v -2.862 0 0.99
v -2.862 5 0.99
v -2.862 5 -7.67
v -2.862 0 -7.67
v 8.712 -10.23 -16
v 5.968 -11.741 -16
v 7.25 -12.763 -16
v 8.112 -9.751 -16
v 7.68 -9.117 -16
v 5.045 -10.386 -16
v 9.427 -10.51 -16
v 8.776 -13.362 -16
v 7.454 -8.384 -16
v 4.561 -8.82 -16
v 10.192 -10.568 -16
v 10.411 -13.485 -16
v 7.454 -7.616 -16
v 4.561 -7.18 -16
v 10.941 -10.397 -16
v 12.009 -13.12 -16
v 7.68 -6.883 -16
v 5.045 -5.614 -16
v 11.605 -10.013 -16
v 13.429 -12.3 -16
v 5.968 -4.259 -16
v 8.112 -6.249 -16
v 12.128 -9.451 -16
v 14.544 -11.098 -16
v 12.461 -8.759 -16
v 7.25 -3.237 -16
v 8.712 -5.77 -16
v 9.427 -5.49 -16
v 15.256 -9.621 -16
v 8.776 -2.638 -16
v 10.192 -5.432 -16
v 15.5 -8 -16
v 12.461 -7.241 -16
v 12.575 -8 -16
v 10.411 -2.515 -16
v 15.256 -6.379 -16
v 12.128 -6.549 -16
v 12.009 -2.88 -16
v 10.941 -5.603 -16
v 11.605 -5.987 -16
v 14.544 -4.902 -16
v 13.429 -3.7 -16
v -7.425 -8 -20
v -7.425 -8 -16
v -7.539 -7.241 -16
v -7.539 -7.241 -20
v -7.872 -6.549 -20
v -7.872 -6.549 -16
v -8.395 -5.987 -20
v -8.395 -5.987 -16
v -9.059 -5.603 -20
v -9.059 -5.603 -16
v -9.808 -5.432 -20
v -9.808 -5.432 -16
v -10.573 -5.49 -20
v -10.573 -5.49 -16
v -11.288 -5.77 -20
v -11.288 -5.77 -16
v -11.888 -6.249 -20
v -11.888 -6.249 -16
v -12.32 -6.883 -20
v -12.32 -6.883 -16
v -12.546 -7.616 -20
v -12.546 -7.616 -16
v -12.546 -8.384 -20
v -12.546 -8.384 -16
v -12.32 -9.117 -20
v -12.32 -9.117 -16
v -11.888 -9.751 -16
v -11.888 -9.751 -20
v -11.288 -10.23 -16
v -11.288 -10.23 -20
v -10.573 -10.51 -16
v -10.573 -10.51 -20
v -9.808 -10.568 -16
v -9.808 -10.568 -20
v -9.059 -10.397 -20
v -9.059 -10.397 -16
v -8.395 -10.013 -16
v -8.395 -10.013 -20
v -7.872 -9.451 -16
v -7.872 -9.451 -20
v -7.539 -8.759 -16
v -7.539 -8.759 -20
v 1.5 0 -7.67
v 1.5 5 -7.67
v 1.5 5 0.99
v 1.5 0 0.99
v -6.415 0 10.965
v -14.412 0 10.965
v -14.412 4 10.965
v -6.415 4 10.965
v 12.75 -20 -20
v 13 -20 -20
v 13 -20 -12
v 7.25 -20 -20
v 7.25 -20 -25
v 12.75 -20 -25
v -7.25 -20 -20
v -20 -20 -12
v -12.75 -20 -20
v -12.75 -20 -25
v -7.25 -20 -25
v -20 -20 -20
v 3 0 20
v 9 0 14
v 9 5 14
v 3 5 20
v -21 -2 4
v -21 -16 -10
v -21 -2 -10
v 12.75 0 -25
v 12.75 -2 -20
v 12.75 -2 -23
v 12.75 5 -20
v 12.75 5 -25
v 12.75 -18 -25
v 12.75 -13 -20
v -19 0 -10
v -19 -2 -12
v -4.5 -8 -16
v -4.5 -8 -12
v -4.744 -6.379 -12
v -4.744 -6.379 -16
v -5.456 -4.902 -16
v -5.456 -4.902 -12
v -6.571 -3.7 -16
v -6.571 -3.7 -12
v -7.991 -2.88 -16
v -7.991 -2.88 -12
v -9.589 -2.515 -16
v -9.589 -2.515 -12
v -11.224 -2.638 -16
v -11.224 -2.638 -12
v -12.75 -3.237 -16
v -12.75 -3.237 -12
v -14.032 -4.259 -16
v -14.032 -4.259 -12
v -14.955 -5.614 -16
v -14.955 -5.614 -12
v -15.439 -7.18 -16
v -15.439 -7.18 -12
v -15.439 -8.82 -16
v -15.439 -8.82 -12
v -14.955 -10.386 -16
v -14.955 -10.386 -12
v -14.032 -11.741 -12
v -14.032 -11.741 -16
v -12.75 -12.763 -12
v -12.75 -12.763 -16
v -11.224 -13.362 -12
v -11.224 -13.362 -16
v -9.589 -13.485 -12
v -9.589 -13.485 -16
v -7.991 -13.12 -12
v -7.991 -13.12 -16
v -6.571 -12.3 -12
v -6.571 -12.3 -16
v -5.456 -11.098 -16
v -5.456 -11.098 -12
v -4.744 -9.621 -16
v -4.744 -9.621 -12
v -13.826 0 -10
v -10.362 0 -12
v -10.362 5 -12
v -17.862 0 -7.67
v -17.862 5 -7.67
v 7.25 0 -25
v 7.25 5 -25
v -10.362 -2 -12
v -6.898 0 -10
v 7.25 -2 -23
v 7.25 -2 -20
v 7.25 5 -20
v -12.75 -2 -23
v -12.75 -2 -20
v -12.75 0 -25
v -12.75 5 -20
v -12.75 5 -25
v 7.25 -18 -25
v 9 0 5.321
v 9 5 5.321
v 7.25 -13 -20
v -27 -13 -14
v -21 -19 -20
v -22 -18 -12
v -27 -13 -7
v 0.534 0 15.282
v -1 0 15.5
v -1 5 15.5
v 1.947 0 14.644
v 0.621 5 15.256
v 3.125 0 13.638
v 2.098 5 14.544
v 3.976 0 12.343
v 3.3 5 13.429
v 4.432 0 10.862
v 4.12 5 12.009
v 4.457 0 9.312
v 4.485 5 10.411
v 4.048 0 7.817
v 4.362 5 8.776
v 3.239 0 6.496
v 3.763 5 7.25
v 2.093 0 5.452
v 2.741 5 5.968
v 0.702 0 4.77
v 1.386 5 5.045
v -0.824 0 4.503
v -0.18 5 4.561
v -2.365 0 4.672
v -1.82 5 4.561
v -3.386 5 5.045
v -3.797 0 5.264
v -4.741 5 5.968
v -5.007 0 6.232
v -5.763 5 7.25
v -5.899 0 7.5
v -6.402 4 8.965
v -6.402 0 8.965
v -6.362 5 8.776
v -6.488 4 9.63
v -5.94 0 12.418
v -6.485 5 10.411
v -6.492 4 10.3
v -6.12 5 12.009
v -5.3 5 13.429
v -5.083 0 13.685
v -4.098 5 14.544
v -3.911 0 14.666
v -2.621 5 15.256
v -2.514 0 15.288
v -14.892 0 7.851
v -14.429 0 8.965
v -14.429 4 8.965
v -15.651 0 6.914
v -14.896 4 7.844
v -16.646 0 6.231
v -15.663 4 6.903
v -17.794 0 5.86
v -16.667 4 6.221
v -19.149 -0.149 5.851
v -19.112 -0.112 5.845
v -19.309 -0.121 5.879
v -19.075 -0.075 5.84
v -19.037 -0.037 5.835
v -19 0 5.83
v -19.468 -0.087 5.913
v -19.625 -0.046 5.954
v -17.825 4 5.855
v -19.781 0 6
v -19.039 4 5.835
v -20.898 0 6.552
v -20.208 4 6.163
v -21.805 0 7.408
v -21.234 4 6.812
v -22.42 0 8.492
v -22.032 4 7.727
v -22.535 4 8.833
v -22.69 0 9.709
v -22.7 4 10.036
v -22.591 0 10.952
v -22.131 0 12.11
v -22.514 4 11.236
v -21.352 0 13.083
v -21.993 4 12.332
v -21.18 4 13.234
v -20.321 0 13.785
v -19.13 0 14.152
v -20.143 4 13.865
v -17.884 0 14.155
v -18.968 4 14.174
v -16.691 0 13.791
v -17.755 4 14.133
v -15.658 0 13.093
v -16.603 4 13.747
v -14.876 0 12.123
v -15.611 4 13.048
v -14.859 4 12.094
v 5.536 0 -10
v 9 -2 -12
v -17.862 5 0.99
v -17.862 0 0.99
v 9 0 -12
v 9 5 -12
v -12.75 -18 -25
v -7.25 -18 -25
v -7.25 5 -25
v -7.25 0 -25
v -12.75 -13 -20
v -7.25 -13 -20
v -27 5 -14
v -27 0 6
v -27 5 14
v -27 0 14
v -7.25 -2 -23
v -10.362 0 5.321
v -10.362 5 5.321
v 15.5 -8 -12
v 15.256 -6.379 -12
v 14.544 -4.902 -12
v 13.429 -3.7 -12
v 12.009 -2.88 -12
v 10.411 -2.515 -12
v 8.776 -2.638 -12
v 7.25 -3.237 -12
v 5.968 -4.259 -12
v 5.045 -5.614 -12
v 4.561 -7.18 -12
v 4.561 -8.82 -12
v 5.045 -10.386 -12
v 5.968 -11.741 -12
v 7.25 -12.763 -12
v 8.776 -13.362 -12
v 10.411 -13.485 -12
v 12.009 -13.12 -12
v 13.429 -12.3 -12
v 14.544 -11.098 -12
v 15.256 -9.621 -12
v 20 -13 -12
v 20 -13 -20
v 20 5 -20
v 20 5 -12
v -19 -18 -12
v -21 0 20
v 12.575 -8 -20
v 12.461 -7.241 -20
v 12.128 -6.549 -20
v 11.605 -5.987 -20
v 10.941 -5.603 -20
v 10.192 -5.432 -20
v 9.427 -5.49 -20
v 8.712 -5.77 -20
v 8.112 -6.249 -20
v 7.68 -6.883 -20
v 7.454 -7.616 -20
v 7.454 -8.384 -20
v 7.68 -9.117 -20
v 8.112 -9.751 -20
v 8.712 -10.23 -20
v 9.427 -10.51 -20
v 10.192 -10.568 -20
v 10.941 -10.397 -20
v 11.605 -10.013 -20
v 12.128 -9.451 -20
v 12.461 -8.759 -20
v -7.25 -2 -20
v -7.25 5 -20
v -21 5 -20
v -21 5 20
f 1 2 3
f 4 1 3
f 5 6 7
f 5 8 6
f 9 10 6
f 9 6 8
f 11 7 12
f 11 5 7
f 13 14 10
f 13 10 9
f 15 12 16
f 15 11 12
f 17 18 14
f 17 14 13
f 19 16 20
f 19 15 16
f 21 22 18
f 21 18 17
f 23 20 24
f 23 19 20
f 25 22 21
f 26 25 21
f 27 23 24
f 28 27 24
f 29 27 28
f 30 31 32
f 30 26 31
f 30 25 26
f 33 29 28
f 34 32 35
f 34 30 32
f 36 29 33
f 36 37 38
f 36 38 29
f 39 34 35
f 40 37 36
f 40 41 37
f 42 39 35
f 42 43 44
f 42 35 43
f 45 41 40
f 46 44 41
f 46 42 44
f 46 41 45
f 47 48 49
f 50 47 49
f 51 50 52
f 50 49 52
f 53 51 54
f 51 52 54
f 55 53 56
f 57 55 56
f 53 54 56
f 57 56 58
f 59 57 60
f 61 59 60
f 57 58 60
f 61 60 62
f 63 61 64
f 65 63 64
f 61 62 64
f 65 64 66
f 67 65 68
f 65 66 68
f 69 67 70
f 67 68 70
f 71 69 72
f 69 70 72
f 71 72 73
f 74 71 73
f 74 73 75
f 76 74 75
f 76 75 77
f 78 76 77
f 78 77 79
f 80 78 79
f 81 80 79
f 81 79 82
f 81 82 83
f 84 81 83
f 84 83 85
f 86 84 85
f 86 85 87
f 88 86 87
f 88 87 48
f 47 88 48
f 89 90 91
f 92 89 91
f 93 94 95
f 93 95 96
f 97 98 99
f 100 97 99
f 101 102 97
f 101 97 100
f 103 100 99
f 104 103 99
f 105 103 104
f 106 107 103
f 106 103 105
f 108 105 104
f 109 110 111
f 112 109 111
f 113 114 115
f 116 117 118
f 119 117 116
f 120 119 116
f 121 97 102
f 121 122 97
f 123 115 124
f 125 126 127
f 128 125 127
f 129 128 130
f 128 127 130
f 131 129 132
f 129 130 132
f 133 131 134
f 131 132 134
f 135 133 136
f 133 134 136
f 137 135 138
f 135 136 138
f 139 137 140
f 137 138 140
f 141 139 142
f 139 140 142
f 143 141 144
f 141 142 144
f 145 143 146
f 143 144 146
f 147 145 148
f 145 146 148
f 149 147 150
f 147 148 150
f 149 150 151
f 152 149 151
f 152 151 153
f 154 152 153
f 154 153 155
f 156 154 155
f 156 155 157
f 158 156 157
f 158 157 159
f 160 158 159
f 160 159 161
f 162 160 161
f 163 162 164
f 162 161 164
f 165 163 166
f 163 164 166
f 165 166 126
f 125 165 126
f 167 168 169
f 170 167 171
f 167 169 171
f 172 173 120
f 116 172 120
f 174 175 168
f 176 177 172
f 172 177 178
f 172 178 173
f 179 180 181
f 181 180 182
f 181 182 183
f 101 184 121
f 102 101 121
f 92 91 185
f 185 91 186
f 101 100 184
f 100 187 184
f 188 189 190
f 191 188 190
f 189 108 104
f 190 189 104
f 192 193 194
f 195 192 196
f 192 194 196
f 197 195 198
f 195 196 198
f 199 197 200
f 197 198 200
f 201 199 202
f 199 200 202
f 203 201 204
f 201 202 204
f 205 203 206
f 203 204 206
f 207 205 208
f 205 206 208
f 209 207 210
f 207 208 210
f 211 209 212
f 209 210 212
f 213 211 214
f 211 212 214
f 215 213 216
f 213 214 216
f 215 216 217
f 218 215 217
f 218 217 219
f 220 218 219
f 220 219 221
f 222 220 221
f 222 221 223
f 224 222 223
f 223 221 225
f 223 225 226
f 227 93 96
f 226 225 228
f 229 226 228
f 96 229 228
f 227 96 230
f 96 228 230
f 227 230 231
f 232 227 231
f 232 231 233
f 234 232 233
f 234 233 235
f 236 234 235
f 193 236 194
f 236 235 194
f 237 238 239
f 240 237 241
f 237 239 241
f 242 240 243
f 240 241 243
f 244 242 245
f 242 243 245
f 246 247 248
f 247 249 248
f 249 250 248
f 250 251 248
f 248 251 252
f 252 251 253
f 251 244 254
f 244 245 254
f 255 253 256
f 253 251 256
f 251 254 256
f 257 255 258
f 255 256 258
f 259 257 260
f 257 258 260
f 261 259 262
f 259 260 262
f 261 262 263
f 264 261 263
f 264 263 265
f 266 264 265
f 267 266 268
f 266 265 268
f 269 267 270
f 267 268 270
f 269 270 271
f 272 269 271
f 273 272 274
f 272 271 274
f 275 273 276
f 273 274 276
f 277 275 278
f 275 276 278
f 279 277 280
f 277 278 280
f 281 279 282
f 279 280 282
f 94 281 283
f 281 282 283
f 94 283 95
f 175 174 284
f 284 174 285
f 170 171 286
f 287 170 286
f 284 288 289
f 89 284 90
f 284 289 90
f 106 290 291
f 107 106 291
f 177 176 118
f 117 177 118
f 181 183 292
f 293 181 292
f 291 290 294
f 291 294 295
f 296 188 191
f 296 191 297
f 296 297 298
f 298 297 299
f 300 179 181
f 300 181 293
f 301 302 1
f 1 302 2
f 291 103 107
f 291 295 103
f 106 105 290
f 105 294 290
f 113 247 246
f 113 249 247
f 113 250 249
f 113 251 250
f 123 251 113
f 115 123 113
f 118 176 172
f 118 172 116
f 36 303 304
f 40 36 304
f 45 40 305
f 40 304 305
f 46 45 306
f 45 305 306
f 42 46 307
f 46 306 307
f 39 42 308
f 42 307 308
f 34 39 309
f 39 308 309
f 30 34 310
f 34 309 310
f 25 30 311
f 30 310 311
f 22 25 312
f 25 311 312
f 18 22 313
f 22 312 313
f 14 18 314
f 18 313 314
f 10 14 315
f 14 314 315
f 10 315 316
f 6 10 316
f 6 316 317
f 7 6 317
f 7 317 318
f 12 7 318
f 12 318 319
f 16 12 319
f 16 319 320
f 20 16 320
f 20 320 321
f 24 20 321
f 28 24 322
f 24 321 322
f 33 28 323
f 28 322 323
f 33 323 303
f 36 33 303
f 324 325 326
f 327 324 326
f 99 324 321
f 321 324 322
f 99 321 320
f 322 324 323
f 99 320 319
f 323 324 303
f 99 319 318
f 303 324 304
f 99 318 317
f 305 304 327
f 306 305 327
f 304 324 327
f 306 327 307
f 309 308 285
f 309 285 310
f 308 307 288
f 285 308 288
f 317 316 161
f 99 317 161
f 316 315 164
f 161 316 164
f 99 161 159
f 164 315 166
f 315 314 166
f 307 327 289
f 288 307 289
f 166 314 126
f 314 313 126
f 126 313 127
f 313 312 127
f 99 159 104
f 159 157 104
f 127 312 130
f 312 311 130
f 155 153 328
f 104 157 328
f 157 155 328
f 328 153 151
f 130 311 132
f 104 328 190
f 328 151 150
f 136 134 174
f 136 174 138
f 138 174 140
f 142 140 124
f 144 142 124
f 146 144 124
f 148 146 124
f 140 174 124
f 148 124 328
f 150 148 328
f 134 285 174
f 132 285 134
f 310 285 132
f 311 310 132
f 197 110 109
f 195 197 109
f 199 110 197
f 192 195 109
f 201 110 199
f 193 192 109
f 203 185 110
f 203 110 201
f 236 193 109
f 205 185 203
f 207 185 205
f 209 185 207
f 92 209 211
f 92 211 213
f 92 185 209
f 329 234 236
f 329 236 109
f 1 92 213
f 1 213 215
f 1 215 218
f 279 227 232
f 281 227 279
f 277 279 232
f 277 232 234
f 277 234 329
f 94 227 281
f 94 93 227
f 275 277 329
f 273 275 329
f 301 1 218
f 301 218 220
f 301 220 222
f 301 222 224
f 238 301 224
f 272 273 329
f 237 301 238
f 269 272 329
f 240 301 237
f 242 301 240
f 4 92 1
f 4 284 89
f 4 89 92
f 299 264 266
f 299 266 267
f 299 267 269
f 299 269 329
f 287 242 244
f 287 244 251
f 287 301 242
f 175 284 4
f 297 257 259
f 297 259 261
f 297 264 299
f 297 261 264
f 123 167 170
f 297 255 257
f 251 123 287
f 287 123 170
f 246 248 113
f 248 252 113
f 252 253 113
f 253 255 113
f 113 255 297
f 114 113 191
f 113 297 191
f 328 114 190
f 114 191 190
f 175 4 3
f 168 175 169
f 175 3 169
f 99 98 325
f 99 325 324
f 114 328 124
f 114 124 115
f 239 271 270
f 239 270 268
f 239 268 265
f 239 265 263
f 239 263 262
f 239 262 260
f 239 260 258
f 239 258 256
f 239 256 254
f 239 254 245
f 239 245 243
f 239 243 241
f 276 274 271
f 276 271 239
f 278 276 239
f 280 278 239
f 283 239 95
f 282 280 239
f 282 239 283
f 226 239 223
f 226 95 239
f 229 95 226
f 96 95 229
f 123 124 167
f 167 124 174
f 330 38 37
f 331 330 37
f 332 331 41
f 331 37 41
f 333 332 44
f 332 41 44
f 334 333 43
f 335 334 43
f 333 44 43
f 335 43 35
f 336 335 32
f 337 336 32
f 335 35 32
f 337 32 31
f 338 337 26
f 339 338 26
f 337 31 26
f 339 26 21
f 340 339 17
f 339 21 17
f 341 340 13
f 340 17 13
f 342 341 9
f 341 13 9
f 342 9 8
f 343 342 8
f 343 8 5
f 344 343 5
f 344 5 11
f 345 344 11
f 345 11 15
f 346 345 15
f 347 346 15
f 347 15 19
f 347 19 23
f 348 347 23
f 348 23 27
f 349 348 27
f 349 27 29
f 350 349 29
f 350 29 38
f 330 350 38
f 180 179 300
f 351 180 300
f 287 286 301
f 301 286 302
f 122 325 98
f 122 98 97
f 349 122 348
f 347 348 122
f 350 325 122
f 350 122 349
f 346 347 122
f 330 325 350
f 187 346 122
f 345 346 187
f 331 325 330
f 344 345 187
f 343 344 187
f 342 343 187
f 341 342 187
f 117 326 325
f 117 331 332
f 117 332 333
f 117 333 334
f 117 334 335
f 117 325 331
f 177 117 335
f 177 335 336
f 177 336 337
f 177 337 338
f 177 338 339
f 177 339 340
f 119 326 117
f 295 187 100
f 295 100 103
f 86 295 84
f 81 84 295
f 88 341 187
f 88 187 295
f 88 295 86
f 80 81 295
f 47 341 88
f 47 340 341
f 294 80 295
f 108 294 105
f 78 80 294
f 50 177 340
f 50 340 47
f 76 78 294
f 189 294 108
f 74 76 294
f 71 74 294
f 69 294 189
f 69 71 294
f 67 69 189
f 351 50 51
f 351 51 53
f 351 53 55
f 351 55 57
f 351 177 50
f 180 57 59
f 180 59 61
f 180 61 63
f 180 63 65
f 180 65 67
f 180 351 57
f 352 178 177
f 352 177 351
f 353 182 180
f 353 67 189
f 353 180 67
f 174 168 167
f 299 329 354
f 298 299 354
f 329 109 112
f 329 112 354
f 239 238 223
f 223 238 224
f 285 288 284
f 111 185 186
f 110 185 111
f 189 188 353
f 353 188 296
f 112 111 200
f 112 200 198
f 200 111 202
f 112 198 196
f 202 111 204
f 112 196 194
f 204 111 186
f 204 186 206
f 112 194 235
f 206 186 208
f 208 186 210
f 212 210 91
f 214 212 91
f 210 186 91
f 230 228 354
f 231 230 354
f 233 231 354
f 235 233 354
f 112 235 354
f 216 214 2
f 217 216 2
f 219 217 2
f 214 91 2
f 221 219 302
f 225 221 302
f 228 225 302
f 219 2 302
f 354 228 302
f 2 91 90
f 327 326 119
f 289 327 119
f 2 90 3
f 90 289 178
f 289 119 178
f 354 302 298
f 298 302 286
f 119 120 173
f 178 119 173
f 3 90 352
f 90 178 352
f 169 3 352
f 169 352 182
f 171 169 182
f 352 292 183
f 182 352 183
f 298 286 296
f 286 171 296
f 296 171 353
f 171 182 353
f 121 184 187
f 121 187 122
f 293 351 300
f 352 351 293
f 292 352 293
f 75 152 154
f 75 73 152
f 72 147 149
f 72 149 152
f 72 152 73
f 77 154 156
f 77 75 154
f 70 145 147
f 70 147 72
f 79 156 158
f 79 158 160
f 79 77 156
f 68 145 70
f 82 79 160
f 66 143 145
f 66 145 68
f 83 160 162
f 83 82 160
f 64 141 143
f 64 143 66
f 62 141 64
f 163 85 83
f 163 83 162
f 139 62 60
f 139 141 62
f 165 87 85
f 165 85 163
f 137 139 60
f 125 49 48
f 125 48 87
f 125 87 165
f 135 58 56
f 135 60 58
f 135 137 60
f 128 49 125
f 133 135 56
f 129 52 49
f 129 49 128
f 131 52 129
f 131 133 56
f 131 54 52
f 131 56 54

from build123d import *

# Parameters (mm, degrees)
BOSS_EXTRUDE1_DEPTH = 5
SKETCH3_W           = 47
SKETCH3_H           = 25
BOSS_EXTRUDE2_DEPTH = 8
RIB2_REACH          = 56.854
SKETCH9_WALL_W      = 137.164549338
SKETCH9_WALL_H      = 6
SKETCH2_R           = 5.5
SKETCH2_R_2         = 4.2
CUT_EXTRUDE1_DEPTH  = 5
SKETCH4_R           = 2.575
CUT_EXTRUDE2_DEPTH  = 8
SKETCH11_W          = 5.5
SKETCH11_H          = 5
BOSS_EXTRUDE5_DEPTH = 7
SKETCH12_R          = 4.941066883
BOSS_EXTRUDE6_DEPTH = 1
SKETCH7_R           = 5.5
CUT_EXTRUDE3_DEPTH  = 4
SKETCH10_W          = 11.059960659
SKETCH10_H          = 2
CUT_EXTRUDE4_DEPTH  = 4
CHAMFER1_SIZE       = 6
CHAMFER2_SIZE       = 7
CHAMFER4_SIZE       = 2
LPATTERN1_COUNT     = 2
LPATTERN1_PITCH     = 18
CHAMFER5_SIZE       = 2
CHAMFER6_SIZE       = 5


# Some blends are built 0.0001 mm under size
with BuildPart() as part:
    # Sketch1 → Boss-Extrude1 (new body)
    with BuildSketch(Plane(origin=(0, 0, 0), x_dir=(1, 0, 0), z_dir=(0, 1, 0))):
        Polygon((20, 20), (20, 12), (9, 12), (9, -20), (-27, -20), (-27, 20), align=None)
    extrude(amount=BOSS_EXTRUDE1_DEPTH)

    # Sketch3 → Boss-Extrude2 (add)
    with BuildSketch(Plane(origin=(0, 0, -20), x_dir=(-1, 0, 0), z_dir=(0, 0, -1))):
        with Locations((3.5, -7.5)):
            Rectangle(SKETCH3_W, SKETCH3_H)
    extrude(amount=-BOSS_EXTRUDE2_DEPTH)

    # Sketch9 wall → Rib2 (add, up to next)
    with BuildSketch(Plane(origin=(-27, -9, -3), x_dir=(0, 0.707106781187, 0.707106781187), z_dir=(0, 0.707106781187, -0.707106781187)), mode=Mode.PRIVATE) as rib2_sk1:
        with Locations((0, 3)):
            Rectangle(SKETCH9_WALL_W, SKETCH9_WALL_H)
    rib2_tool1 = extrude(rib2_sk1.sketch, amount=RIB2_REACH, mode=Mode.PRIVATE) - part.part
    add(rib2_tool1.solids().sort_by_distance((-27, -9, -3))[0])

    # Sketch2 → Cut-Extrude1 (cut)
    with BuildSketch(Plane(origin=(0, 5, 0), x_dir=(1, 0, 0), z_dir=(0, 1, 0))):
        with Locations(Location((-1, -10, 0), (0, 0, 270))):
            Circle(SKETCH2_R)
        with Locations(Location((-18.5, -10, 0), (0, 0, 270))):
            Circle(SKETCH2_R_2)
        Polygon((9, -5.320508076), (16.5, -0.990381057), (16.5, 7.669872981), (9, 12), (1.5, 7.669872981), (1.5, -0.990381057), align=None)
        Polygon((-10.36219397, -5.320508076), (-2.86219397, -0.990381057), (-2.86219397, 7.669872981), (-10.36219397, 12), (-17.86219397, 7.669872981), (-17.86219397, -0.990381057), align=None)
    extrude(amount=-CUT_EXTRUDE1_DEPTH, mode=Mode.SUBTRACT)

    # Sketch4 → Cut-Extrude2 (cut)
    with BuildSketch(Plane.XY.offset(-12)):
        with Locations((-10, -8)):
            Circle(SKETCH4_R)
        with Locations((10, -8)):
            Circle(SKETCH4_R)
    extrude(amount=-CUT_EXTRUDE2_DEPTH, mode=Mode.SUBTRACT)

    # Sketch11 → Boss-Extrude5 (add)
    with BuildSketch(Plane(origin=(0, 5, 0), x_dir=(1, 0, 0), z_dir=(0, 1, 0))):
        with Locations((-10, 22.5)):
            Rectangle(SKETCH11_W, SKETCH11_H)
        with Locations((10, 22.5)):
            Rectangle(SKETCH11_W, SKETCH11_H)
    boss_extrude5 = extrude(amount=-BOSS_EXTRUDE5_DEPTH)

    # Sketch12 → Boss-Extrude6 (add)
    with BuildSketch(Plane(origin=(0, 5, 0), x_dir=(1, 0, 0), z_dir=(0, 1, 0))):
        with Locations((-18.5, -10)):
            Circle(SKETCH12_R)
    extrude(amount=-BOSS_EXTRUDE6_DEPTH)

    # Sketch7 → Cut-Extrude3 (cut)
    with BuildSketch(Plane.XY.offset(-12)):
        with Locations((-10, -8)):
            Circle(SKETCH7_R)
        with Locations((10, -8)):
            Circle(SKETCH7_R)
    extrude(amount=-CUT_EXTRUDE3_DEPTH, mode=Mode.SUBTRACT)

    # Sketch10 → Cut-Extrude4 (cut)
    with BuildSketch(Plane.XZ):
        with Locations((-10.613093562, 9.96527114)):
            Rectangle(SKETCH10_W, SKETCH10_H)
    extrude(amount=-CUT_EXTRUDE4_DEPTH, mode=Mode.SUBTRACT)

    # Chamfer1
    chamfer1_edges = [part.edges().sort_by_distance(p)[0] for p in [
        (-27, -7.5, -20),
        (9, 2.5, 20),
        (-27, 2.5, 20),
    ]]
    chamfer(chamfer1_edges, length=CHAMFER1_SIZE)

    # Chamfer2
    chamfer2_edges = [part.edges().sort_by_distance(p)[0] for p in [
        (-27, -20, -13),
        (20, -20, -16),
    ]]
    chamfer(chamfer2_edges, length=CHAMFER2_SIZE)

    # Chamfer4
    # the kernel refuses this chamfer: 2 mm, written as the material it adds along each edge
    with BuildSketch(Plane(origin=(-19.666666667, -1.333333333, -10.666666667), x_dir=(-0.7071067811865462, -0.7071067811865488, 1.1932702685996668e-13), z_dir=(-0.5773502691896611, 0.5773502691895617, -0.5773502691896545))) as chamfer4_piece_1_section:
        Polygon((-1.414213562, 0.816496581), (1.414213562, 0.816496581), (0, -1.632993162), align=None)
    chamfer4_piece_1 = extrude(amount=2.540341184, mode=Mode.PRIVATE)
    chamfer4_piece_1 = split(chamfer4_piece_1, bisect_by=Plane(origin=(-21, 0, -12), z_dir=(0, -1, 0)), keep=Keep.TOP, mode=Mode.PRIVATE)
    chamfer4_piece_1 = split(chamfer4_piece_1, bisect_by=Plane(origin=(-21, 0, -12), z_dir=(1, 0, 0)), keep=Keep.TOP, mode=Mode.PRIVATE)
    chamfer4_piece_1 = split(chamfer4_piece_1, bisect_by=Plane(origin=(-21, 0, -12), z_dir=(0, 0, 1)), keep=Keep.TOP, mode=Mode.PRIVATE)
    add(chamfer4_piece_1)
    with BuildSketch(Plane(origin=(14.143365976, 0, -12), x_dir=(0, -0.9996219169112968, -0.027495876610586494), z_dir=(-1, 0, 0))) as chamfer4_piece_2_section:
        Polygon((CHAMFER4_SIZE * 0.999621916911, CHAMFER4_SIZE * 0.0274958766106), (-CHAMFER4_SIZE * 0.0274958766106, CHAMFER4_SIZE * 0.999621916911), (0, 0), align=None)
    chamfer4_piece_2 = extrude(amount=24.505559946, mode=Mode.PRIVATE)
    chamfer4_piece_2 = split(chamfer4_piece_2, bisect_by=Plane(origin=(1.470049267, -0.68923776, -7.652580917), z_dir=(-0.5000000000000001, 0, -0.8660254037844387)), keep=Keep.TOP, mode=Mode.PRIVATE)
    chamfer4_piece_2 = split(chamfer4_piece_2, bisect_by=Plane(origin=(-2.832243237, -0.68923776, -7.652580917), z_dir=(0.5000000000000001, 0, -0.8660254037844386)), keep=Keep.TOP, mode=Mode.PRIVATE)
    add(chamfer4_piece_2)
    with BuildSketch(Plane(origin=(-21, -23.143365976, -12), x_dir=(0.9996219169112965, 0, -0.027495876610597728), z_dir=(0, 1, 0))) as chamfer4_piece_3_section:
        Polygon((CHAMFER4_SIZE * 0.999621916911, -CHAMFER4_SIZE * 0.0274958766106), (-CHAMFER4_SIZE * 0.0274958766106, -CHAMFER4_SIZE * 0.999621916911), (0, 0), align=None)
    chamfer4_piece_3 = extrude(amount=23.143365976, mode=Mode.PRIVATE)
    chamfer4_piece_3 = split(chamfer4_piece_3, bisect_by=Plane(origin=(-20.326923077, -13.009615385, -7.009615385), z_dir=(0, 0.7071067811865476, -0.7071067811865476)), keep=Keep.TOP, mode=Mode.PRIVATE)
    add(chamfer4_piece_3)
    with BuildSketch(Plane(origin=(-21, 0, -17.143365976), x_dir=(0.9996219169112968, 0.02749587661058649, 0), z_dir=(0, 0, 1))) as chamfer4_piece_4_section:
        Polygon((CHAMFER4_SIZE * 0.999621916911, -CHAMFER4_SIZE * 0.0274958766106), (-CHAMFER4_SIZE * 0.0274958766106, -CHAMFER4_SIZE * 0.999621916911), (0, 0), align=None)
    chamfer4_piece_4 = extrude(amount=28.286731952, mode=Mode.PRIVATE)
    chamfer4_piece_4 = split(chamfer4_piece_4, bisect_by=Plane(origin=(-20.327046258, -4.990950262, 1.009049738), z_dir=(0, 0.7071067811865476, -0.7071067811865476)), keep=Keep.TOP, mode=Mode.PRIVATE)
    chamfer4_piece_4 = chamfer4_piece_4 - Plane(origin=(-18.5, -0.653916776, 10), x_dir=(0, 0, 1), z_dir=(0, 1, 0)) * Cylinder(4.2, 65, mode=Mode.PRIVATE)
    add(chamfer4_piece_4)
    with BuildSketch(Plane(origin=(-10.36219397, 0, -12), x_dir=(0, -0.9996219169112998, -0.027495876610477744), z_dir=(-1, 0, 0))) as chamfer4_piece_5_section:
        Polygon((CHAMFER4_SIZE * 0.999621916911, CHAMFER4_SIZE * 0.0274958766106), (-CHAMFER4_SIZE * 0.0274958766105, CHAMFER4_SIZE * 0.999621916911), (0, 0), align=None)
    chamfer4_piece_5 = extrude(amount=15.781172006, mode=Mode.PRIVATE)
    chamfer4_piece_5 = split(chamfer4_piece_5, bisect_by=Plane(origin=(-15.029121281, -0.686960661, -9.305548261), z_dir=(-0.5000000000000003, 0, -0.8660254037844387)), keep=Keep.TOP, mode=Mode.PRIVATE)
    add(chamfer4_piece_5)

    # LPattern1: Boss-Extrude5 ×2
    with Locations(*[(0, -i * LPATTERN1_PITCH, 0) for i in range(1, LPATTERN1_COUNT)]):
        add(boss_extrude5)

    # Chamfer5
    chamfer5_edges = [part.edges().sort_by_distance(p)[0] for p in [
        (-10, -2, -25),
        (10, -2, -25),
    ]]
    chamfer(chamfer5_edges, length=CHAMFER5_SIZE)

    # Chamfer6
    chamfer6_edges = [part.edges().sort_by_distance(p)[0] for p in [
        (-10, -13, -25),
        (10, -13, -25),
    ]]
    chamfer(chamfer6_edges, length=CHAMFER6_SIZE - 0.0001)  # a hair under: the kernel refuses the full size


solid = part.part
